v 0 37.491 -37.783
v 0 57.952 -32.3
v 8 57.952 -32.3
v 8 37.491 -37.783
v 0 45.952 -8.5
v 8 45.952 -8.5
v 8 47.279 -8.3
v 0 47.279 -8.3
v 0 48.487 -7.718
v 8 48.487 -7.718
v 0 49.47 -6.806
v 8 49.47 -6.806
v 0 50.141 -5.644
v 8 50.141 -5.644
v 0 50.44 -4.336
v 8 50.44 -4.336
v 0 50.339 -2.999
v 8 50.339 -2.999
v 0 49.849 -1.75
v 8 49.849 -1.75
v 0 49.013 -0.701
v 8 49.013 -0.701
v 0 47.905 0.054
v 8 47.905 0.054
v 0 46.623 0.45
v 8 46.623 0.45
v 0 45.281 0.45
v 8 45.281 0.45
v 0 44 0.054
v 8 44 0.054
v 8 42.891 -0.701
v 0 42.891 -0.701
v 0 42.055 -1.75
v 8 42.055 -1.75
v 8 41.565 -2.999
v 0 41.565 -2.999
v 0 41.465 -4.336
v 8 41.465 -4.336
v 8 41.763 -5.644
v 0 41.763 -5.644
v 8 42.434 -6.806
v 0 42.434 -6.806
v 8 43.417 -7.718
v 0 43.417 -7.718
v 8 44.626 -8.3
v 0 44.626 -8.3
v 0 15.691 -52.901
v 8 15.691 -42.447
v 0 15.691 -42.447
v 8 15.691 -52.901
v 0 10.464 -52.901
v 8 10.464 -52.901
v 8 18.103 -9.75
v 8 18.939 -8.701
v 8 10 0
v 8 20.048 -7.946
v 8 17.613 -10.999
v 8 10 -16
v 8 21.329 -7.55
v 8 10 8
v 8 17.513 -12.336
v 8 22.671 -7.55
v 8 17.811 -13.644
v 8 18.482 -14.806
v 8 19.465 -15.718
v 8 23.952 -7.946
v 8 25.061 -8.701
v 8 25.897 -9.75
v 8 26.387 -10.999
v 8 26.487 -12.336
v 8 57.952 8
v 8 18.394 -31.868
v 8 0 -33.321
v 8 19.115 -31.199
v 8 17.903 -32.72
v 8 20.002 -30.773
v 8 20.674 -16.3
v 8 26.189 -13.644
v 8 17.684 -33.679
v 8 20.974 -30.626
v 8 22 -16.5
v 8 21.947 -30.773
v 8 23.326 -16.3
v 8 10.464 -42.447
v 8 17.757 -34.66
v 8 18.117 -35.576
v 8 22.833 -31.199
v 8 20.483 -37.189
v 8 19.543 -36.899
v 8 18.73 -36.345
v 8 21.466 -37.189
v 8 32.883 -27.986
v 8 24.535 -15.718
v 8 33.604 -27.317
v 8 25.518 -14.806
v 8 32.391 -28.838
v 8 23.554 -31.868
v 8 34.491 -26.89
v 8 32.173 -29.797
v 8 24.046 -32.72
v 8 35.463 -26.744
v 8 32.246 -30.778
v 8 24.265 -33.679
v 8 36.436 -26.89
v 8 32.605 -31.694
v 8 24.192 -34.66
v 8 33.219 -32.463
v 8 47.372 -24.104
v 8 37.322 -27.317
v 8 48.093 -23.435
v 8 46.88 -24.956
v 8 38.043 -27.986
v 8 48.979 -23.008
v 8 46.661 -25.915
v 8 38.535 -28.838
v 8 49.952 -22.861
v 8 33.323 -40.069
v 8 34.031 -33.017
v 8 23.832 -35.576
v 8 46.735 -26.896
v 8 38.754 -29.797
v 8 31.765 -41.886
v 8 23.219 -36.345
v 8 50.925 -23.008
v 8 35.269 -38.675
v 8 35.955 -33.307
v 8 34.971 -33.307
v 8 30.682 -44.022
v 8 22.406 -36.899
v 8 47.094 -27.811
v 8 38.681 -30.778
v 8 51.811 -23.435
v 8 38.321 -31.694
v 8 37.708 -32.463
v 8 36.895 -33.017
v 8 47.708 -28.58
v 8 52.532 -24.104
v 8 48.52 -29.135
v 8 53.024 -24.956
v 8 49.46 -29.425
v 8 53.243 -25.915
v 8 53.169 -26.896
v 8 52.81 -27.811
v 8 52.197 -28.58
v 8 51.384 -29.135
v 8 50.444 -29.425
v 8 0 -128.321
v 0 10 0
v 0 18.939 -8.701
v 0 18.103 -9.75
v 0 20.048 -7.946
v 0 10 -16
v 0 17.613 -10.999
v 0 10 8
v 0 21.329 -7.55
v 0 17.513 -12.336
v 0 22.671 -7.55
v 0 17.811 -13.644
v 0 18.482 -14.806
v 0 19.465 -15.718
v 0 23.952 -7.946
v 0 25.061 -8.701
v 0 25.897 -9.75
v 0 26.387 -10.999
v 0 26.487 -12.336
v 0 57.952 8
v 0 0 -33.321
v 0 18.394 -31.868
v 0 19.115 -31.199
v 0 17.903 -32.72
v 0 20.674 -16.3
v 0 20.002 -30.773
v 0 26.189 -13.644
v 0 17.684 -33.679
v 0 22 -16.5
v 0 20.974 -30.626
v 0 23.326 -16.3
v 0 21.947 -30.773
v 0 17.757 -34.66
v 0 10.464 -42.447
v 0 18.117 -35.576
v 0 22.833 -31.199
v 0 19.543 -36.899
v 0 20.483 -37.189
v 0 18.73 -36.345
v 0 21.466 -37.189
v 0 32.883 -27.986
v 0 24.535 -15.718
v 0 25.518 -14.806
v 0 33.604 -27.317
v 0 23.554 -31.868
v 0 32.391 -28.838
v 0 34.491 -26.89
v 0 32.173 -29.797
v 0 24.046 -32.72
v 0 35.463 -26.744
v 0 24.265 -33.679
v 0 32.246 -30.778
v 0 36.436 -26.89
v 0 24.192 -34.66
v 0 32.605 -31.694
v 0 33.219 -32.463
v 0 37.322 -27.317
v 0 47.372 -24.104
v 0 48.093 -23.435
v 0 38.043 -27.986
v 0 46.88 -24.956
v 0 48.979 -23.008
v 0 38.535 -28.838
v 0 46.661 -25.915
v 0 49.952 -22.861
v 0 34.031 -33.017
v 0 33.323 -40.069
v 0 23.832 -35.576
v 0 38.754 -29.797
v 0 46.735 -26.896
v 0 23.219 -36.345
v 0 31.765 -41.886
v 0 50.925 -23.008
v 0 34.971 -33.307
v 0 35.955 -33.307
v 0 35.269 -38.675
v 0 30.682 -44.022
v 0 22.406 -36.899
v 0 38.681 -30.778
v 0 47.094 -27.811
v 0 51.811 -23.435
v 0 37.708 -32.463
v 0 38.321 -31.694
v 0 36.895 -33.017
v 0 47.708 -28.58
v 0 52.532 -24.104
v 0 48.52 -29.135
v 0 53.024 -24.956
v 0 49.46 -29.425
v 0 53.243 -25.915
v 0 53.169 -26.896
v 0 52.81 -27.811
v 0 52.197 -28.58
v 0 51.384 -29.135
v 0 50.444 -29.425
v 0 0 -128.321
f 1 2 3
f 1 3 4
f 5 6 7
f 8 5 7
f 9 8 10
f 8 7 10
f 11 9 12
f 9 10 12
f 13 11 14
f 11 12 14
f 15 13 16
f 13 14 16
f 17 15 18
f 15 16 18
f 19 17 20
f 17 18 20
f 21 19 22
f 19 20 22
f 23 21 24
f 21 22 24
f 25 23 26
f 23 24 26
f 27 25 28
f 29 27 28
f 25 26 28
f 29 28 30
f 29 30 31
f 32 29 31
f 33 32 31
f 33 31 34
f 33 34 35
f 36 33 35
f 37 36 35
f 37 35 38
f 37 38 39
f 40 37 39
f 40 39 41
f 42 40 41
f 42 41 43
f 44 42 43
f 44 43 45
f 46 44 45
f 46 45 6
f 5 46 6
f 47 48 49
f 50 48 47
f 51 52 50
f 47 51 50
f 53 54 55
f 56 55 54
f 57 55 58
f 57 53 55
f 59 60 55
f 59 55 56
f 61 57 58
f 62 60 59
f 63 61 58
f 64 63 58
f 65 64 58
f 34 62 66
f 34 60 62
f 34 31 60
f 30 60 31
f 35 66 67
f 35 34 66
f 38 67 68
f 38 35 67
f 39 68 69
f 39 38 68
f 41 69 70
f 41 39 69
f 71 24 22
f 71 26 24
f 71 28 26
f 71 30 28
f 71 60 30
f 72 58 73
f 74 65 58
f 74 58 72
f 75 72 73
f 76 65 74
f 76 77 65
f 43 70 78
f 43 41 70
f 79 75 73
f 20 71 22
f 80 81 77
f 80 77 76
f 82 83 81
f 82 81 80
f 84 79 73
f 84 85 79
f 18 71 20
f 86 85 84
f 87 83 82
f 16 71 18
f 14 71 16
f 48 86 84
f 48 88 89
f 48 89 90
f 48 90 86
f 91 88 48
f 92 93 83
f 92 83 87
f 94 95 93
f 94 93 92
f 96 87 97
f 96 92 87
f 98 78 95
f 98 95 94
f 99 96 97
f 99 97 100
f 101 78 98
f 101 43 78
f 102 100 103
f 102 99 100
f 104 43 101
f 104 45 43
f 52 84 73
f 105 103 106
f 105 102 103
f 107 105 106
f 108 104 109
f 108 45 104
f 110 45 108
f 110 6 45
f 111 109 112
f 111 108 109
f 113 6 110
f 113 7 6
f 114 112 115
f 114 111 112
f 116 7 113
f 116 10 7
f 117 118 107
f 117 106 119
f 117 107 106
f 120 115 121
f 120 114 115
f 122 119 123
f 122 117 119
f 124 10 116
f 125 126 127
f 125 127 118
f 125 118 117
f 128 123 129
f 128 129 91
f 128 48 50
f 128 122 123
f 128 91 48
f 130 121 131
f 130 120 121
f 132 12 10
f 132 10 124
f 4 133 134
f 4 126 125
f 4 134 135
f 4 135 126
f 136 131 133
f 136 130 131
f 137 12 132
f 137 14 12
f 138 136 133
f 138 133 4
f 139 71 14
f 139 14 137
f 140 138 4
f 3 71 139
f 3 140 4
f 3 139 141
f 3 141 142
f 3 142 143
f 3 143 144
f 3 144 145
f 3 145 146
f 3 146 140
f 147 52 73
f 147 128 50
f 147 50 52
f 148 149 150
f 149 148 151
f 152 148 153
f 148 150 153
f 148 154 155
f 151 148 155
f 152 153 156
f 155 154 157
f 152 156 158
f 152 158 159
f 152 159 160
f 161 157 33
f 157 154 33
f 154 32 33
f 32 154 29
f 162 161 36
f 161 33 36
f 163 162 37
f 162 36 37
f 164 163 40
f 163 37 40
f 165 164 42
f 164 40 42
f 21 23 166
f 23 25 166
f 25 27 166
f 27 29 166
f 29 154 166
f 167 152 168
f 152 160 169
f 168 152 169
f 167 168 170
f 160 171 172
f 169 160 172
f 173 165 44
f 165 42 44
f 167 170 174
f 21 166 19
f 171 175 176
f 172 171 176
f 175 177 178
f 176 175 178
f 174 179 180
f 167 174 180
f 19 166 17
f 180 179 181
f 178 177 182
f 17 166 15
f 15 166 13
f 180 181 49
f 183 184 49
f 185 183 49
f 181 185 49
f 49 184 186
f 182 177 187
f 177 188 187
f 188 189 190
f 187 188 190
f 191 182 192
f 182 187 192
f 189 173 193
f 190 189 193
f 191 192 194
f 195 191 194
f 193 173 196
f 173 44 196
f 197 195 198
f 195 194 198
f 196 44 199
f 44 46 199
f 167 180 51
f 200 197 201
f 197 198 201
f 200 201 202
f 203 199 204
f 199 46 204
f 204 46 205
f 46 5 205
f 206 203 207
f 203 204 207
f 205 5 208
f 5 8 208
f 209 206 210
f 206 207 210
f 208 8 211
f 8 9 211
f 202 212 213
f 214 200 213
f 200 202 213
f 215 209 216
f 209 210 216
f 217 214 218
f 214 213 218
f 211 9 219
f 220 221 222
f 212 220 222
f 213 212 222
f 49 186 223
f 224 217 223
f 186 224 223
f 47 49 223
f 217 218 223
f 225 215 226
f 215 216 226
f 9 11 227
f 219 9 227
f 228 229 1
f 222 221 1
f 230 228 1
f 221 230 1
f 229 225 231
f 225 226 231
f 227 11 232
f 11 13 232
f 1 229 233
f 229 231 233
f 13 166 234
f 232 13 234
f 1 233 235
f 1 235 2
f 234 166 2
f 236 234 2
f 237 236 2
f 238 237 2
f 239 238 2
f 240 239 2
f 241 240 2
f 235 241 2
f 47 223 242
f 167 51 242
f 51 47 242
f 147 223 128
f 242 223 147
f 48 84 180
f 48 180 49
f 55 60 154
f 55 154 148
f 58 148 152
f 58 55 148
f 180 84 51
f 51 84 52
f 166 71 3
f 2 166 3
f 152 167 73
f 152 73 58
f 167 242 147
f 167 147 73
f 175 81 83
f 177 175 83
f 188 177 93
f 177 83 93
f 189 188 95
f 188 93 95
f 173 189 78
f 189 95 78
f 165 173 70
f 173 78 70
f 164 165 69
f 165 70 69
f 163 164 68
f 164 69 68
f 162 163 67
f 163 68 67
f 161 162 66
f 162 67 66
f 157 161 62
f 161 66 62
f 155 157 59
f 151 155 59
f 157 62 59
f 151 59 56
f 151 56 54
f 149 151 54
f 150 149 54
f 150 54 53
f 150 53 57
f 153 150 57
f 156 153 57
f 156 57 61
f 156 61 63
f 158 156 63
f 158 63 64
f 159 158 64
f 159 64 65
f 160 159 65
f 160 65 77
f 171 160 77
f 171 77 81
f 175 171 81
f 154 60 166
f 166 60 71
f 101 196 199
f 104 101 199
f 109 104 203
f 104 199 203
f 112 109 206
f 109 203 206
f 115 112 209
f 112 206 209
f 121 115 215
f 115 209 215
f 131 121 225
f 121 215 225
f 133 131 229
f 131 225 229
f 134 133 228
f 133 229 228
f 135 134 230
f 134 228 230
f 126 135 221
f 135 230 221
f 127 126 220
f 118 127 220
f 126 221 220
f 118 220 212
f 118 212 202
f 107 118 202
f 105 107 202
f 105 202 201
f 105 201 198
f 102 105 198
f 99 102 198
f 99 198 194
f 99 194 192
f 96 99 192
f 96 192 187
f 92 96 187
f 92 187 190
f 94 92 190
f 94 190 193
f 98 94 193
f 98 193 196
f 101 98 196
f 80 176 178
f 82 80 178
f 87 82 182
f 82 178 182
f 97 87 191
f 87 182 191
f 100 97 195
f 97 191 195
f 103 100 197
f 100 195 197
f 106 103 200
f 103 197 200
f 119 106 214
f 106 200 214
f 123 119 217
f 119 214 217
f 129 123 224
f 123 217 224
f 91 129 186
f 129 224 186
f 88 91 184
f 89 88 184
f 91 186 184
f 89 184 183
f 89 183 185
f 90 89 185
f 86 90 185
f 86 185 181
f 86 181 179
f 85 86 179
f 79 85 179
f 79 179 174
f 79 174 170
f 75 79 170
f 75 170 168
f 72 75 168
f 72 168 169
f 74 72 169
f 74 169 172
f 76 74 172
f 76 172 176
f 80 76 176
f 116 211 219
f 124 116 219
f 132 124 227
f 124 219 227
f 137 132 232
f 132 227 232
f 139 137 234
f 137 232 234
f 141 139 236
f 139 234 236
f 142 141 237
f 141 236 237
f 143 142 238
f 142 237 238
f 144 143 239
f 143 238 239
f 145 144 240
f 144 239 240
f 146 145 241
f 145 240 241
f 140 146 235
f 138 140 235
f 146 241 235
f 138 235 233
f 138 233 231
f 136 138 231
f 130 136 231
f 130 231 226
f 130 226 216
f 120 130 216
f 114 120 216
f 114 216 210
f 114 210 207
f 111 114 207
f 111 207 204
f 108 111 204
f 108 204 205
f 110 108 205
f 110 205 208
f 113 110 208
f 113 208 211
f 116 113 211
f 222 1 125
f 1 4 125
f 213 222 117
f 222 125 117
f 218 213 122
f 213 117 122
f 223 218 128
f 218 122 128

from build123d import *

# Parameters (mm, degrees)
RESSALTO_EXTRUS_O1_DEPTH = 8
ESBO_O2_W                = 32.3
ESBO_O2_H                = 16.047818473
CORTE_EXTRUS_O1_DEPTH    = 149.344709352
ESBO_O3_W                = 8
ESBO_O3_H                = 47.952181527
RESSALTO_EXTRUS_O2_DEPTH = 8
FURO_COM_FOLGA_DE_M81_D  = 9
FURO_COM_FOLGA_DE_M61_D  = 6.6
FILETE1_R                = 10
ESBO_O9_W                = 10.453941956
ESBO_O9_H                = 5.226970978
CORTE_EXTRUS_O2_DEPTH    = 142.026976627


with BuildPart() as part:
    # Esboço1 → Ressalto-extrusão1 (new body)
    with BuildSketch(Plane(origin=(0, 0, 0), x_dir=(0, 0, -1), z_dir=(1, 0, 0))):
        Polygon((28, 74), (39.129876604, 32.462735031), (128.320508076, 0), (33.320508076, 0), (16, 10), (0, 10), (0, 74), align=None)
    extrude(amount=RESSALTO_EXTRUS_O1_DEPTH)

    # Esboço2 → Corte-extrusão1 (cut, through all)
    with BuildSketch(Plane(origin=(8, 0, 0), x_dir=(0, 0, -1), z_dir=(1, 0, 0))):
        with Locations((16.15, 65.976090763)):
            Rectangle(ESBO_O2_W, ESBO_O2_H)
    extrude(amount=-CORTE_EXTRUS_O1_DEPTH, mode=Mode.SUBTRACT)

    # Esboço3 → Ressalto-extrusão2 (add)
    with BuildSketch(Plane(origin=(8, 0, 0), x_dir=(0, 0, -1), z_dir=(1, 0, 0))):
        with Locations((-4, 33.976090763)):
            Rectangle(ESBO_O3_W, ESBO_O3_H)
    extrude(amount=-RESSALTO_EXTRUS_O2_DEPTH)

    # Furo com folga de M81 (through all)
    with Locations(Plane.ZY):
        with Locations((-4, 45.952181527), (-12, 22)):
            Hole(FURO_COM_FOLGA_DE_M81_D / 2)

    # Furo com folga de M61 (through all)
    with Locations(Plane(origin=(8, 0, 0), x_dir=(0, 0, -1), z_dir=(1, 0, 0))):
        with Locations((26.161384096, 49.952181527), (30.043669773, 35.463294133), (33.925955449, 20.974406739)):
            Hole(FURO_COM_FOLGA_DE_M61_D / 2)

    # Filete1
    filete1_edges = [part.edges().sort_by_distance(p)[0] for p in [
        (4, 32.462735031, -39.129876604),
    ]]
    fillet(filete1_edges, radius=FILETE1_R)

    # Esboço9 → Corte-extrusão2 (cut, through all)
    with BuildSketch(Plane(origin=(8, 0, 0), x_dir=(0, 0, -1), z_dir=(1, 0, 0))):
        with Locations((47.673601146, 13.077387372)):
            Rectangle(ESBO_O9_W, ESBO_O9_H)
    extrude(amount=-CORTE_EXTRUS_O2_DEPTH, mode=Mode.SUBTRACT)


solid = part.part
